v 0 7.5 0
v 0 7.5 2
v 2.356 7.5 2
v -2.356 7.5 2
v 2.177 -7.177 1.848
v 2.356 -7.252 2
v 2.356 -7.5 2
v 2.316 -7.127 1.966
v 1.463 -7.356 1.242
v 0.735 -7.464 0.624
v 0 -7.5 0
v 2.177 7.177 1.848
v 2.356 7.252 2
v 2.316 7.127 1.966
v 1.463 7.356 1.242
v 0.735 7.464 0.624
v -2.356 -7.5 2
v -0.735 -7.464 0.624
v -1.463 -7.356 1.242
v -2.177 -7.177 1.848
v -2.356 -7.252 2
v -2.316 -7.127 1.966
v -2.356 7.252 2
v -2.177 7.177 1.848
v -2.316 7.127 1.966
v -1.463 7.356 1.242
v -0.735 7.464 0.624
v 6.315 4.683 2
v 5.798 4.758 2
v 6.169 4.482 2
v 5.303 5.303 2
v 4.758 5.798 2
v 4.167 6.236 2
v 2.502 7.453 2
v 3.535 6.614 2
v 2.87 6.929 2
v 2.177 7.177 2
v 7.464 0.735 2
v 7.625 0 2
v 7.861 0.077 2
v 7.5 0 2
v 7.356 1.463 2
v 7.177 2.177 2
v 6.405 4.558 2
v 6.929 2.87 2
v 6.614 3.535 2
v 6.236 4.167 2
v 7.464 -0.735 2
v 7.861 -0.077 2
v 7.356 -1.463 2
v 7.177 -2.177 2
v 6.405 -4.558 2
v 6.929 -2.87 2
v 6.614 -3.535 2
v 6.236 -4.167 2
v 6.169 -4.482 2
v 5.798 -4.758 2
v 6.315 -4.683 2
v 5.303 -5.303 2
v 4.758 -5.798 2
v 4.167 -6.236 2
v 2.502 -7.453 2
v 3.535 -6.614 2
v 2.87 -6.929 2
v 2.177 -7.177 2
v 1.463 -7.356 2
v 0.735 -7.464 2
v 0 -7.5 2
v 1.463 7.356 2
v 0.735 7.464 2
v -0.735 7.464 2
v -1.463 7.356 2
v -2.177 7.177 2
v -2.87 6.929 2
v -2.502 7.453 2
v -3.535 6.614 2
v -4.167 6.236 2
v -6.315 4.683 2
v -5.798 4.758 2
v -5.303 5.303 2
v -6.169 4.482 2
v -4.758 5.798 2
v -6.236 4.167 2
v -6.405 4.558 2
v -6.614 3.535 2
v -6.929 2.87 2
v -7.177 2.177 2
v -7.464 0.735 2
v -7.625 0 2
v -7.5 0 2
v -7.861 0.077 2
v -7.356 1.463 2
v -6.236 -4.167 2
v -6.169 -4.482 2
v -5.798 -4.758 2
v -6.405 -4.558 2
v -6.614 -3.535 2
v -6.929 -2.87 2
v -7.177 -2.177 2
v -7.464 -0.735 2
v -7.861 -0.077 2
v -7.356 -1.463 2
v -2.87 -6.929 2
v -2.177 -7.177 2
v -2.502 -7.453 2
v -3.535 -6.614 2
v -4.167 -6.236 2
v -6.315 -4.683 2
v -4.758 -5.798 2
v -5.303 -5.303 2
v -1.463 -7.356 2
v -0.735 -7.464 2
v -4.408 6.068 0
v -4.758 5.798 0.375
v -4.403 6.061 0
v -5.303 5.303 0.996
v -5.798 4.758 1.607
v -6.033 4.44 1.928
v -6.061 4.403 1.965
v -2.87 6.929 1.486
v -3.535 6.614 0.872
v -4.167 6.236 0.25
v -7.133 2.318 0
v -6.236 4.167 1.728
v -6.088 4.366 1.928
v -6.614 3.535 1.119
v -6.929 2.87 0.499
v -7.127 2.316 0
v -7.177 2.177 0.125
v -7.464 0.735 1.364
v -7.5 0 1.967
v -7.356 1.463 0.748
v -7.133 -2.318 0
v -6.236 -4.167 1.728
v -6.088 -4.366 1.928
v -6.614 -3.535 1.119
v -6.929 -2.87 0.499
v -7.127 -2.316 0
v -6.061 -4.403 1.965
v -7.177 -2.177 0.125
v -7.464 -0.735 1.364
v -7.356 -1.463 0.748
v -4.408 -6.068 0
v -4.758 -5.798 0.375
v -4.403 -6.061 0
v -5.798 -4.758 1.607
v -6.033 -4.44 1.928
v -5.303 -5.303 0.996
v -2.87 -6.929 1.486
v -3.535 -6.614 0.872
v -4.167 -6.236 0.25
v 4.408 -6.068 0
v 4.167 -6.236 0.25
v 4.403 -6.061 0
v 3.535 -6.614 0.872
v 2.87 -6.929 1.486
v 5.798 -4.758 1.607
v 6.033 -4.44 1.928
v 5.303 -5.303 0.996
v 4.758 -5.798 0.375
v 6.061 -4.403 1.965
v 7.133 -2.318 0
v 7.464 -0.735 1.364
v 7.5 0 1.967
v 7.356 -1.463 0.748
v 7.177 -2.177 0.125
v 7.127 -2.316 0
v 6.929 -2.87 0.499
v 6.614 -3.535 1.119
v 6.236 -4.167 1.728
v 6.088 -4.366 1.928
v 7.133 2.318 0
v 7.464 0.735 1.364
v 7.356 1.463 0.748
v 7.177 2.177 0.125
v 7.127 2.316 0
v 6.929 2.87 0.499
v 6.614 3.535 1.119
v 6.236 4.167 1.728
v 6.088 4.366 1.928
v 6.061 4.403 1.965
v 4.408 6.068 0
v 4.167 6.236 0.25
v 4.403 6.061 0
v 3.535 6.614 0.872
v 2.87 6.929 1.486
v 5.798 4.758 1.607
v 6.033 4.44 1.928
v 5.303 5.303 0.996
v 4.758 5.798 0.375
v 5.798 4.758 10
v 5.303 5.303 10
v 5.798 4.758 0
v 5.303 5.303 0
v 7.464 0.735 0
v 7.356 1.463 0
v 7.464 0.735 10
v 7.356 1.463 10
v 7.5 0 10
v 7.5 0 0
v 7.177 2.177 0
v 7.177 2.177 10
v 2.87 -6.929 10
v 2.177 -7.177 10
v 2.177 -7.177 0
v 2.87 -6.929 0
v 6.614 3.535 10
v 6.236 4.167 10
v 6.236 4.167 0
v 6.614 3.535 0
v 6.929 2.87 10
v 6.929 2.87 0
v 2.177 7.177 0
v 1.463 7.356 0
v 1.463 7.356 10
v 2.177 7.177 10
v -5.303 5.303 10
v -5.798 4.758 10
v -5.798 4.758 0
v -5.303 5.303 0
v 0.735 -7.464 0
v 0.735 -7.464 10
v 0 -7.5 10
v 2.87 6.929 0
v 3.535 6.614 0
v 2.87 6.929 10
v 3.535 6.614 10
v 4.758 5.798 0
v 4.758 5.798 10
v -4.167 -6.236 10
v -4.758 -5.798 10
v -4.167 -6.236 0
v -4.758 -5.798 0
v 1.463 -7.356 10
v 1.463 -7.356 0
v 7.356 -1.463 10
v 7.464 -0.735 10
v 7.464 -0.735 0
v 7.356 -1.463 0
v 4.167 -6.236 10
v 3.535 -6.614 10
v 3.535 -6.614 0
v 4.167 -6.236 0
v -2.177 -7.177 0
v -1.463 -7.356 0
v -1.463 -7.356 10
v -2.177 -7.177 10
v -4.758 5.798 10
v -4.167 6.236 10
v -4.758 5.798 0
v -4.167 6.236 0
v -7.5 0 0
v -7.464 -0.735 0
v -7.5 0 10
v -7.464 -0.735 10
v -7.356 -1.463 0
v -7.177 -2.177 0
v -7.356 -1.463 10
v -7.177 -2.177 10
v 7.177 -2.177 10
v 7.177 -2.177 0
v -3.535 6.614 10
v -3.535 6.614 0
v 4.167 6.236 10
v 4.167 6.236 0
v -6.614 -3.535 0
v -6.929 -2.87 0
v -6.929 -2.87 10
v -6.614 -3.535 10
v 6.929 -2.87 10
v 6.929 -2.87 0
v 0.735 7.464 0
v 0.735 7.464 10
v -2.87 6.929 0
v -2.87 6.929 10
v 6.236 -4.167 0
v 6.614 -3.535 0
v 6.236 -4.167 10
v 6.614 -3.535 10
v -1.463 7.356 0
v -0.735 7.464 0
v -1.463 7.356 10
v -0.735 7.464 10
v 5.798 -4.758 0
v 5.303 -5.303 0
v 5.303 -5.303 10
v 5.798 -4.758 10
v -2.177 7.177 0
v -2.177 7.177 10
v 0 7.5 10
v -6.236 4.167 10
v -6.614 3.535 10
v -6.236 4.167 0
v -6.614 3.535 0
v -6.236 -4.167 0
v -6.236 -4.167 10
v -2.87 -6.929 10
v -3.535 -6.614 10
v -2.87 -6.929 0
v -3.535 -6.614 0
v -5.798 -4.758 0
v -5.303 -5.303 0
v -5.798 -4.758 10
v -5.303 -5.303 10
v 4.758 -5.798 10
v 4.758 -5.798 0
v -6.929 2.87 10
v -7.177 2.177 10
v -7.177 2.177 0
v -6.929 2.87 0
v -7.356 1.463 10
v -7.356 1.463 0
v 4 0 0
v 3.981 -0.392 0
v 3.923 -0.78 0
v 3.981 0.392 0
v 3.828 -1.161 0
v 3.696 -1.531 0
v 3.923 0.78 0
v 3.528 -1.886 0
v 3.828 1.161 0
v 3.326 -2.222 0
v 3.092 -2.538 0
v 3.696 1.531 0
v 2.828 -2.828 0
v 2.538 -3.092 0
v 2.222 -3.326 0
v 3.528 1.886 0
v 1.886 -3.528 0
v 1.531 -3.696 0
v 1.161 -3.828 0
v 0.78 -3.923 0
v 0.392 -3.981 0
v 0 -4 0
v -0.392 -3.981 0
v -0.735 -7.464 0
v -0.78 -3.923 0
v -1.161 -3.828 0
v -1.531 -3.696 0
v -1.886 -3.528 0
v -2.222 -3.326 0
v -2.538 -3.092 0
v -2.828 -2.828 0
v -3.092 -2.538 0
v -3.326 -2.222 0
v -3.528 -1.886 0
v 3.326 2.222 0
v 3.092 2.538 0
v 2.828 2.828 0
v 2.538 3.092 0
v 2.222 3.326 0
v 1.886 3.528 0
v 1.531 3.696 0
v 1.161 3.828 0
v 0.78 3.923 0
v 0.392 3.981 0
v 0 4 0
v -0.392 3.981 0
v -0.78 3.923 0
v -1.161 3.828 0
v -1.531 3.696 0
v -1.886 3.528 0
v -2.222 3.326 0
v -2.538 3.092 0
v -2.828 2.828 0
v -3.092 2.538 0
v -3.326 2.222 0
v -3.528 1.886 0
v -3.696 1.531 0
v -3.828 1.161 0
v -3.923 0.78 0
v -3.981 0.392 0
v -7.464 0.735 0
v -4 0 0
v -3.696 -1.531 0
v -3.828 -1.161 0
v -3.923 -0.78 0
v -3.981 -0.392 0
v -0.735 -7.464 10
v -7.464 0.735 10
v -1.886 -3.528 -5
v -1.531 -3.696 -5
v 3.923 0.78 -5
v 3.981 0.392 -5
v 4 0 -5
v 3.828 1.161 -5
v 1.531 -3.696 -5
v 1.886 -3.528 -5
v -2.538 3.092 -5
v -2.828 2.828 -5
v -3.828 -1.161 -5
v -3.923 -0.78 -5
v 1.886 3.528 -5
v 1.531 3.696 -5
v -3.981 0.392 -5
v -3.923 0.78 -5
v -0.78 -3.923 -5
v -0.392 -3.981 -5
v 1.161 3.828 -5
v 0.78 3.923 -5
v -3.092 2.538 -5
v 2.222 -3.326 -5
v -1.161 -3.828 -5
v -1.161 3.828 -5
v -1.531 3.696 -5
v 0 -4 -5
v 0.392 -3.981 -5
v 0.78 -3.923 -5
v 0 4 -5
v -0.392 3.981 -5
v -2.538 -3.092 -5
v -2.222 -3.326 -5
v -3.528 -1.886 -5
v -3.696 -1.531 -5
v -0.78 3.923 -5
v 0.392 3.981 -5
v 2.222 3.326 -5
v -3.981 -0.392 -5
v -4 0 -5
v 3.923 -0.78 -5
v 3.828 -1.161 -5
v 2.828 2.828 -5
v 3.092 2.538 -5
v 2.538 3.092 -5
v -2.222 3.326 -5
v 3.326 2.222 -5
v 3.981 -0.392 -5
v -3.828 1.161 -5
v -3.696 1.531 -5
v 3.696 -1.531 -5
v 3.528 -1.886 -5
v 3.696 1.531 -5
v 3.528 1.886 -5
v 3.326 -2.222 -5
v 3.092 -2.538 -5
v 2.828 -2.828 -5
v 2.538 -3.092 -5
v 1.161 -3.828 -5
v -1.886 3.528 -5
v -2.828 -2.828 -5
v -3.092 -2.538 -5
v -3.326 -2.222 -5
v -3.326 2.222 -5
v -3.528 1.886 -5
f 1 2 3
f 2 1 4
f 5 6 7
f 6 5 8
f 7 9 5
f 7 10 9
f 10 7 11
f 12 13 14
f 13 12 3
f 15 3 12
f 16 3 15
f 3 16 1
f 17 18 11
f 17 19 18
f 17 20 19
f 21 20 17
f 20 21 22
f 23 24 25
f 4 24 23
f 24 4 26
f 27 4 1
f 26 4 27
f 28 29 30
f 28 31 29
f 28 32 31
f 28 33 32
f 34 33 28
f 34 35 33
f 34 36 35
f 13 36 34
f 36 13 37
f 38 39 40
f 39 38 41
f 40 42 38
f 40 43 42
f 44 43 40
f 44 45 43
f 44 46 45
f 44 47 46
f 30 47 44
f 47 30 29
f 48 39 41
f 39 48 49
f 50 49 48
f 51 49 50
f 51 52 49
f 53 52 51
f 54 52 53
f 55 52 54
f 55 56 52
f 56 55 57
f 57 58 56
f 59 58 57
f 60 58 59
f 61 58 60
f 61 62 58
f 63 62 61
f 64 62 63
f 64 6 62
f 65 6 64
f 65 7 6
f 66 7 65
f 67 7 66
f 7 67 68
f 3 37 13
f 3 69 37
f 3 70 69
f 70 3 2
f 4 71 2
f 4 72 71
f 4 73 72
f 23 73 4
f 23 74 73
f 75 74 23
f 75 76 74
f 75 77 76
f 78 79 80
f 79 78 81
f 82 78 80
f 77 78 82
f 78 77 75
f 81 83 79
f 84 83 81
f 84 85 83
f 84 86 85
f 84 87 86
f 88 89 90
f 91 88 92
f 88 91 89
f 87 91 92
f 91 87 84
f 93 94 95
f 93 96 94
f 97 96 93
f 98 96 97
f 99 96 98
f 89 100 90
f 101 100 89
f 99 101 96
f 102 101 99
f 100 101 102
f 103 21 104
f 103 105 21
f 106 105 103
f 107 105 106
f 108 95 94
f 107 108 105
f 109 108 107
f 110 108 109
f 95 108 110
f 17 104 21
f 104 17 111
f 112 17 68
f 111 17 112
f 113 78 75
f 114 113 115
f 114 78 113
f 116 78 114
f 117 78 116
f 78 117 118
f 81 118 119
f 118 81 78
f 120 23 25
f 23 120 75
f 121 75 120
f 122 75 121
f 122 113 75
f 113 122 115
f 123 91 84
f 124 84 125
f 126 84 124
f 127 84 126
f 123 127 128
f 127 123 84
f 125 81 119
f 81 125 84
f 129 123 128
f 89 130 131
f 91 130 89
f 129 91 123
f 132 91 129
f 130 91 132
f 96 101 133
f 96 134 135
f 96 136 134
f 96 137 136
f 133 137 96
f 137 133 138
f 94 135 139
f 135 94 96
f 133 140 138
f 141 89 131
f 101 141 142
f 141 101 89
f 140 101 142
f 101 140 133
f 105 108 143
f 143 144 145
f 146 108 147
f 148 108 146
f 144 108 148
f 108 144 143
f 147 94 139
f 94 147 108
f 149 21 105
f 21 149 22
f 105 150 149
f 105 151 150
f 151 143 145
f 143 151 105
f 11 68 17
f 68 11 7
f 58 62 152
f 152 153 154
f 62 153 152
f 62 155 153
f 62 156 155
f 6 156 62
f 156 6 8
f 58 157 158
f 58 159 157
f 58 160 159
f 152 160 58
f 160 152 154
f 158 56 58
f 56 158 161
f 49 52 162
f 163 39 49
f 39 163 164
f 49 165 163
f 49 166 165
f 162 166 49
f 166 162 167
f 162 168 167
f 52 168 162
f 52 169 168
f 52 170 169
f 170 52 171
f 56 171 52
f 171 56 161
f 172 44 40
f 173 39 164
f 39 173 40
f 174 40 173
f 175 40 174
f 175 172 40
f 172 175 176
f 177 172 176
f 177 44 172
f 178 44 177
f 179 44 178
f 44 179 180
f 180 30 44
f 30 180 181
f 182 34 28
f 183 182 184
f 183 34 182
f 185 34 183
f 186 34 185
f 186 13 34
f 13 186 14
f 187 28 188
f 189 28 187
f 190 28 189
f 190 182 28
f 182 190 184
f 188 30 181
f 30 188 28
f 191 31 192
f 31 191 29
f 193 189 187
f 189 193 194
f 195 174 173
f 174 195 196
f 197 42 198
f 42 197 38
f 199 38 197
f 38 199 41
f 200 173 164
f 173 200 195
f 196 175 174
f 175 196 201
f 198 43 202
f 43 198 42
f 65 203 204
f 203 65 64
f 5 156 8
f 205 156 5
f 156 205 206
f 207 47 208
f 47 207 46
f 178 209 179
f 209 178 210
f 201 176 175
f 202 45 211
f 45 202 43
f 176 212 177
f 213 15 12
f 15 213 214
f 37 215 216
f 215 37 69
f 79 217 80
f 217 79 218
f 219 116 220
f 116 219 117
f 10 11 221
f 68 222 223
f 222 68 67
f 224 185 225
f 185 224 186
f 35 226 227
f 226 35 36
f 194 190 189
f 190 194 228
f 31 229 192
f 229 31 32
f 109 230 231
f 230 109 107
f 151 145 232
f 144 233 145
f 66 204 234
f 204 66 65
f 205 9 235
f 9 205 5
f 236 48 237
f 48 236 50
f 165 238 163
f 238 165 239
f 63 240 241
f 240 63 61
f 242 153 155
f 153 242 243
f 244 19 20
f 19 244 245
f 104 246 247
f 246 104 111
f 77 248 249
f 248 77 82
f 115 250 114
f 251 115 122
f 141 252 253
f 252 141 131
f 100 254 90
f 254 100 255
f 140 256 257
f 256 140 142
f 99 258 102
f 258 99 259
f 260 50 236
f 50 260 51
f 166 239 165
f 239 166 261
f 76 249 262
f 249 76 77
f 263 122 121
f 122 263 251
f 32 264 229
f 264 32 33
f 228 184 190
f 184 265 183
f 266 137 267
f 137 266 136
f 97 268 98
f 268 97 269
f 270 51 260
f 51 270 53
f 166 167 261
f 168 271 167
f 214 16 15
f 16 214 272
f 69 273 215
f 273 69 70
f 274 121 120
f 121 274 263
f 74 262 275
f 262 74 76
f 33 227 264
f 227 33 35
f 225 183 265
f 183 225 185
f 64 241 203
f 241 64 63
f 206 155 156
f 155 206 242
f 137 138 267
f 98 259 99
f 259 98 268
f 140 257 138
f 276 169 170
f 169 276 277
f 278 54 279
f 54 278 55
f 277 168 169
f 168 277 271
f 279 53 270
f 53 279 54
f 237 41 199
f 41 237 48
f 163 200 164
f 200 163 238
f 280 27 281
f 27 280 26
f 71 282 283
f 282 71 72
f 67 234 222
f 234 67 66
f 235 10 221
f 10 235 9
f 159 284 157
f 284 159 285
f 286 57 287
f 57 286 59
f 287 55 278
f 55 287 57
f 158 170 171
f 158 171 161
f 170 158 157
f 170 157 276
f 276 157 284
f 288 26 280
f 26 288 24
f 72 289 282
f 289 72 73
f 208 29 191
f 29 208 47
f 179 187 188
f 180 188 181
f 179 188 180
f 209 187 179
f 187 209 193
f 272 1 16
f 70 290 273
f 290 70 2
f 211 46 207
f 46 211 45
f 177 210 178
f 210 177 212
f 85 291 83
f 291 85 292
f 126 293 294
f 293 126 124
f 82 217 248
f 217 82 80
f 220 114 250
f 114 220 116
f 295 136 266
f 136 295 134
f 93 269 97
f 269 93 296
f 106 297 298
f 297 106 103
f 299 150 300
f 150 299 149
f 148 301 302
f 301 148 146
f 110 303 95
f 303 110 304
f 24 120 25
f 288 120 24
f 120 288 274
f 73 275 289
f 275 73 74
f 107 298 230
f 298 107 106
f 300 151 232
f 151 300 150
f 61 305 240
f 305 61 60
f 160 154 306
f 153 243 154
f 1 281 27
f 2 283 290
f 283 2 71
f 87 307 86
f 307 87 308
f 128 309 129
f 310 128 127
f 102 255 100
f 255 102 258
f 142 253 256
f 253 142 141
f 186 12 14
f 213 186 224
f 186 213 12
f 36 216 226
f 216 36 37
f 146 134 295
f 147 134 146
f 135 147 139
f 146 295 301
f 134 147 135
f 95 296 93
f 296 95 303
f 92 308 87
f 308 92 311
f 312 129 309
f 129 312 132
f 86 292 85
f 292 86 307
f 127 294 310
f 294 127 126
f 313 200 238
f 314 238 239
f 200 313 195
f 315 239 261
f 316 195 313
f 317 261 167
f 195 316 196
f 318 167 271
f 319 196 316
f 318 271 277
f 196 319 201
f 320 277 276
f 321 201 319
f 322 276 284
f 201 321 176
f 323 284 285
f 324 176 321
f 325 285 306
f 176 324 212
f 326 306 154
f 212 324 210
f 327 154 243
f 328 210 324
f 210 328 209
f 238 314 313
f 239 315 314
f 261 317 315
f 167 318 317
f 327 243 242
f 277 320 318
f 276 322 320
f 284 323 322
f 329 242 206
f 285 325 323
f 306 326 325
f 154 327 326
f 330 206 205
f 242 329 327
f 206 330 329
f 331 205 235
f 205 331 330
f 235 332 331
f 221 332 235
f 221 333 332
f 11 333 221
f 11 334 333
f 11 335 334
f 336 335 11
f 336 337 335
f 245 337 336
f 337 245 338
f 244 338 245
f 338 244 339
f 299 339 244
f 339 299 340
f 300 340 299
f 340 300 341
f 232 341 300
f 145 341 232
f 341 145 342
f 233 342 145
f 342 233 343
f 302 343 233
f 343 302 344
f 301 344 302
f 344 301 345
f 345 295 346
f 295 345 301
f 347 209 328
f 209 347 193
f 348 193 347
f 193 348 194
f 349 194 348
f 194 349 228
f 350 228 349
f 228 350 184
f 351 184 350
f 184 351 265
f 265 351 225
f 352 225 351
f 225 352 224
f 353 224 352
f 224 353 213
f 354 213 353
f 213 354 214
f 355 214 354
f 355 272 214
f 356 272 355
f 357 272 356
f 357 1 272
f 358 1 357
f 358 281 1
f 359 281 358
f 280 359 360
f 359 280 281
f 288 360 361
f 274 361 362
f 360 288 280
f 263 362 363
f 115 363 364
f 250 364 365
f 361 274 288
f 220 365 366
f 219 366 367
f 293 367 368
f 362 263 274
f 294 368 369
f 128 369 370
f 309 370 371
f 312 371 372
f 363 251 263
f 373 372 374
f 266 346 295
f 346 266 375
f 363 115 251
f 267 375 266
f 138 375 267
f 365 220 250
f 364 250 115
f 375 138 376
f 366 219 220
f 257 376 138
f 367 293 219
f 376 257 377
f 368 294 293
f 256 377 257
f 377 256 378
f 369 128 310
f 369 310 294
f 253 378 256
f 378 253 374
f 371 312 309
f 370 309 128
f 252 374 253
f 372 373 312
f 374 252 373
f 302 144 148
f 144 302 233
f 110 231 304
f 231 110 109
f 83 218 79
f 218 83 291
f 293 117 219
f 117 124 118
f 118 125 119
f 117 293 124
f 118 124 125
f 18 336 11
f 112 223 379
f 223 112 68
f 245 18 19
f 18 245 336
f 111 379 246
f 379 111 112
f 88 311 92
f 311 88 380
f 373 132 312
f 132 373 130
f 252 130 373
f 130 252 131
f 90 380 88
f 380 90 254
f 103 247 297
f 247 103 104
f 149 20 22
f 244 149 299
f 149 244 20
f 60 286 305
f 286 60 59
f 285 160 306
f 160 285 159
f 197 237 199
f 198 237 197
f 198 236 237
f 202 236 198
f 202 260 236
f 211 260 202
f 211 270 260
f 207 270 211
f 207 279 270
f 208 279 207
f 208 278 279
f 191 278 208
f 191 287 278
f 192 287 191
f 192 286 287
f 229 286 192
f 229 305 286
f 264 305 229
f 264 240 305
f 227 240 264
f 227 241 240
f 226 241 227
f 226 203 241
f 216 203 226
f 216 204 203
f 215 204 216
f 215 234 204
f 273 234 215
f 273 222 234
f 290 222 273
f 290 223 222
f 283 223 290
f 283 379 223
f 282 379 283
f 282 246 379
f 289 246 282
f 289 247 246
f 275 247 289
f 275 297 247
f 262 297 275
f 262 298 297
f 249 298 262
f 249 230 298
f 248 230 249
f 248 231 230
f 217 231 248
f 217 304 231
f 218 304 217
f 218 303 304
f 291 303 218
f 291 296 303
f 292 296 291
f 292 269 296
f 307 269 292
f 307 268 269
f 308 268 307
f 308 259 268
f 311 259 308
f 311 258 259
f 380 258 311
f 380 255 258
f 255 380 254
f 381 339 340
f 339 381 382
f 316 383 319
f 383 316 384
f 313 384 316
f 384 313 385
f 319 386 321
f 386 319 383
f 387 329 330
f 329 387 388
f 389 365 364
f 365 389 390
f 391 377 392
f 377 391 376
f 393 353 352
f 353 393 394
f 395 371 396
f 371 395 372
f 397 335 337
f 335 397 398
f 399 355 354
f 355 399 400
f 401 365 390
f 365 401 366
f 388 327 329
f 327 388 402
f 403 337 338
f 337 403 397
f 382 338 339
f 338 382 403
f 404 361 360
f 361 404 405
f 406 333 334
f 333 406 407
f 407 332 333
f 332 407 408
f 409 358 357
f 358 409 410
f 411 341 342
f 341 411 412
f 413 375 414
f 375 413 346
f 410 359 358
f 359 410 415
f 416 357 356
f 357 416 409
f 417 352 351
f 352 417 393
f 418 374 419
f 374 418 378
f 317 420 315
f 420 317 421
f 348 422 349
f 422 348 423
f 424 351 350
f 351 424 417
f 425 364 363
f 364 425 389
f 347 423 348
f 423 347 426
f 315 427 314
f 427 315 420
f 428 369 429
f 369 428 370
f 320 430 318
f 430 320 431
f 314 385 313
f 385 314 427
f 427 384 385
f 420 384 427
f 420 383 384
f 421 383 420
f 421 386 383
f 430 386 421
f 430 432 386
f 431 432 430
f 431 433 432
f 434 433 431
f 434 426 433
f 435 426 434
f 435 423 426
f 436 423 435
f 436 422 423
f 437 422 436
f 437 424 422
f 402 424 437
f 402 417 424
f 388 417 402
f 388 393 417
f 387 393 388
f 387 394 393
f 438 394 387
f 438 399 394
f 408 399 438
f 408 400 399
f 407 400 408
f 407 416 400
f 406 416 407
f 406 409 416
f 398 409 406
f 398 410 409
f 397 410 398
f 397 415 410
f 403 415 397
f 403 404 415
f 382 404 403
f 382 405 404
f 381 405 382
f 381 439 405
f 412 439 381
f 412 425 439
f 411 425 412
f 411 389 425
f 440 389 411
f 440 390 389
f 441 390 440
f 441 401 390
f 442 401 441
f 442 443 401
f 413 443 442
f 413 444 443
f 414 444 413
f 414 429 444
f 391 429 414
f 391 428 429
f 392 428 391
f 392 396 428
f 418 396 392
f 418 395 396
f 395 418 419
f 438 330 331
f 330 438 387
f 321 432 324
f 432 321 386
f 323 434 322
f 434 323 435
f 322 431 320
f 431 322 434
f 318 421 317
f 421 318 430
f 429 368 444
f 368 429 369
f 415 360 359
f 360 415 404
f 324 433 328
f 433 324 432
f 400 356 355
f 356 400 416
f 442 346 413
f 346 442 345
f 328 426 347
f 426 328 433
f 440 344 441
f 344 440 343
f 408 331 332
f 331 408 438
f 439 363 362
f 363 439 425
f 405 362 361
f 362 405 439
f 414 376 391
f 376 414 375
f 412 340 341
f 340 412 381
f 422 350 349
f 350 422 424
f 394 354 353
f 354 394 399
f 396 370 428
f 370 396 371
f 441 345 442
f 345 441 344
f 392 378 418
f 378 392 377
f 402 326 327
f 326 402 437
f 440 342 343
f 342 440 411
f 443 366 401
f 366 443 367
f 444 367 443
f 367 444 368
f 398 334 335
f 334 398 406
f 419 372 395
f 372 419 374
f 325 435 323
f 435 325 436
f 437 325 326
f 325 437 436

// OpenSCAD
module timing_pulley(teeth=10, pitch_diameter=15.0, belt_width=10.0, hub_diameter=8.0, hub_height=5.0) {
    tooth_height = 2.0;
    tooth_width = pitch_diameter * PI / teeth;
    pulley_height = belt_width + hub_height;
    
    module tooth() {
        translate([0, pitch_diameter / 2, 0])
        rotate([90, 0, 0])
        linear_extrude(height=belt_width)
        polygon(points=[[0, 0], [tooth_width / 2, tooth_height], [-tooth_width / 2, tooth_height]]);
    }
    
    union() {
        // Create the main pulley body
        cylinder(d=pitch_diameter, h=belt_width, $fn=64);
        
        // Add teeth around the pulley
        for (i = [0:teeth-1]) {
            rotate([0, 0, i * 360 / teeth])
            tooth();
        }
        
        // Add the hub
        translate([0, 0, -hub_height])
        cylinder(d=hub_diameter, h=hub_height, $fn=64);
    }
}

timing_pulley();
